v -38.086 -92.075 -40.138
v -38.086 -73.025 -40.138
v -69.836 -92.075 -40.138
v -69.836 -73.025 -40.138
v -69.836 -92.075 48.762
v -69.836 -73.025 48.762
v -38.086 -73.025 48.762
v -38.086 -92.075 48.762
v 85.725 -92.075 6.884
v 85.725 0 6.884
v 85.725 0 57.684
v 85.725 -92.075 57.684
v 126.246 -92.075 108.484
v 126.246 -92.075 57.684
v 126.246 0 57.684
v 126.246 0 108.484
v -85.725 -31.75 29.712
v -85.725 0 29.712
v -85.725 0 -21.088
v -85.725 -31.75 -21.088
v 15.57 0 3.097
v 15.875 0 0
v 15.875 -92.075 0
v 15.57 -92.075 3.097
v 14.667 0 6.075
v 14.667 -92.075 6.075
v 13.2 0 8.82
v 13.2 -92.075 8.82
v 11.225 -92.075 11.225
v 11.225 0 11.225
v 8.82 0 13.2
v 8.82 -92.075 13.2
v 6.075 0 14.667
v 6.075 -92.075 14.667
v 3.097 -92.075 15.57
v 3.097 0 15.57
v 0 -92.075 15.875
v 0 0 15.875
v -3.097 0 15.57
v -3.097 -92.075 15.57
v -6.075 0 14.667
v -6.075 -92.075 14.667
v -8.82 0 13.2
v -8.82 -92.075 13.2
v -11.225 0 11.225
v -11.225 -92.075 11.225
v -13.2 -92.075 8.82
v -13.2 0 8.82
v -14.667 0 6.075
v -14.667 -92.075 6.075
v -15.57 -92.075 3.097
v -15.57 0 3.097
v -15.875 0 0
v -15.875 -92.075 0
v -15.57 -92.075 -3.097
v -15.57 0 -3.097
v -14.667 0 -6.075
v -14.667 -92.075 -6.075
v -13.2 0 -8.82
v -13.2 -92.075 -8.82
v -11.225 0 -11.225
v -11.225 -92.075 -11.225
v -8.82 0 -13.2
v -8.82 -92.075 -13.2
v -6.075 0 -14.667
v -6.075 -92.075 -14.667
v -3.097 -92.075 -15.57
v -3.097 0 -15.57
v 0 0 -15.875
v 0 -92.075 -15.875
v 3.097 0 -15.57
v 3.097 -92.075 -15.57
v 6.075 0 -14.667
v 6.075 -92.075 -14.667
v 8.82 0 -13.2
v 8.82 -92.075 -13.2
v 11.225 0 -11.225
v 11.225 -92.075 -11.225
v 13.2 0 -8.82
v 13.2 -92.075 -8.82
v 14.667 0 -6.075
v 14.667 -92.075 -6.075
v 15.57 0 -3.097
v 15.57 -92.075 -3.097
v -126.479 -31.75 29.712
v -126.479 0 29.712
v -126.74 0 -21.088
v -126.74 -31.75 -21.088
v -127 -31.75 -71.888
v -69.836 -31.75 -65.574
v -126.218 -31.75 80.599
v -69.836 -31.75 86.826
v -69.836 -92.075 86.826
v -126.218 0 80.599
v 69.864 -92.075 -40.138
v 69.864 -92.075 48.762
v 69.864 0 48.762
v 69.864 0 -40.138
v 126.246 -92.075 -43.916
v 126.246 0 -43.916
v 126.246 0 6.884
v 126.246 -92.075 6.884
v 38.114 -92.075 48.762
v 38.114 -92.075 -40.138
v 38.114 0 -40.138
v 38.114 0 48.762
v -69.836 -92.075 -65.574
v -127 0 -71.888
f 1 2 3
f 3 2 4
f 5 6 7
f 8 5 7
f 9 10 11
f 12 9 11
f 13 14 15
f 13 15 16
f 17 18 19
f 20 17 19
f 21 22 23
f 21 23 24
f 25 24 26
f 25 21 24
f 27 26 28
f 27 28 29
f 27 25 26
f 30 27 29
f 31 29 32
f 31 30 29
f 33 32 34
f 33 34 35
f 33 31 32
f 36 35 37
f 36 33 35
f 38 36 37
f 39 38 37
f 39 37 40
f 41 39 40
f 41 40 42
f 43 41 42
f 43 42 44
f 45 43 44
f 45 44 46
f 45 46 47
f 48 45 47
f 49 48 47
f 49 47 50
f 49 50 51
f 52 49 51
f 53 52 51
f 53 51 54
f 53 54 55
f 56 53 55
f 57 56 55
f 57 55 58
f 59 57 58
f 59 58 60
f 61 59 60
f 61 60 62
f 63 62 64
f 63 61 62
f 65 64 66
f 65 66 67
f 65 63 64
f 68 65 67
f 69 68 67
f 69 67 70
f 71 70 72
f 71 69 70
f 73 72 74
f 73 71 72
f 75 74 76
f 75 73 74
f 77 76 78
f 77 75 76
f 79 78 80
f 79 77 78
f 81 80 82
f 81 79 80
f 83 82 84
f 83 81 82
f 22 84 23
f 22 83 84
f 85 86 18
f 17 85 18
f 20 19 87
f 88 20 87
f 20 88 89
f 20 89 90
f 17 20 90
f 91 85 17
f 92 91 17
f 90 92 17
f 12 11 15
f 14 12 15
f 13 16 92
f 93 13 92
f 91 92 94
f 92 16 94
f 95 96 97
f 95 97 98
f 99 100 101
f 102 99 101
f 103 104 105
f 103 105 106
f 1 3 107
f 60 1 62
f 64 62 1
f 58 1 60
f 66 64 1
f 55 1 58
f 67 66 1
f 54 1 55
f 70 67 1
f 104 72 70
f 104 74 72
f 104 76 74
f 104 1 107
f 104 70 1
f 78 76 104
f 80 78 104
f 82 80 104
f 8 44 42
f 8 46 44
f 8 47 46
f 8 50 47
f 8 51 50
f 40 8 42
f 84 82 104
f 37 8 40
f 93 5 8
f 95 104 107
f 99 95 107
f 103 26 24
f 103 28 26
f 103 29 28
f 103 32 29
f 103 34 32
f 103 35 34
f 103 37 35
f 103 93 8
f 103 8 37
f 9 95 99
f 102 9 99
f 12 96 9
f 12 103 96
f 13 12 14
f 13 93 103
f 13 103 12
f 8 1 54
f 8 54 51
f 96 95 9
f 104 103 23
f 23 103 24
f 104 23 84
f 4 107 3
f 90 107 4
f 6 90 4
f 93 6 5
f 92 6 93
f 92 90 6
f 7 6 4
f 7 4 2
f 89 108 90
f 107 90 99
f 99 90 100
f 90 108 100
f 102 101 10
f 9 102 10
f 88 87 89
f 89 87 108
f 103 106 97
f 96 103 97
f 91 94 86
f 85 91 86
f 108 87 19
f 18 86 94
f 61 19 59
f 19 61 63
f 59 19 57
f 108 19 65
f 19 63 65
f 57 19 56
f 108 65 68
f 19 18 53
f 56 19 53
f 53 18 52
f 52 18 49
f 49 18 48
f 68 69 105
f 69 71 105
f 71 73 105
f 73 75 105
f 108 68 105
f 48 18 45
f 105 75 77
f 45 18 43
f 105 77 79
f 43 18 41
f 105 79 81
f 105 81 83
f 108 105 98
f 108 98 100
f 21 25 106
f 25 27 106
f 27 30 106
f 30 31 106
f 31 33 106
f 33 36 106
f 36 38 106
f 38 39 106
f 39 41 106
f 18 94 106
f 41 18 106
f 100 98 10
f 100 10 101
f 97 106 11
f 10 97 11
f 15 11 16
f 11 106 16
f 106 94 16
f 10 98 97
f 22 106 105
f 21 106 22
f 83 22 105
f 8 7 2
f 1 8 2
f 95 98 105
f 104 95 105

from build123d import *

# Parameters (mm, degrees)
F0_R     = 15.875
F1_DEPTH = 31.75
F2_DEPTH = 92.075
F0_W     = 31.75
F0_H     = 88.9
F3_DEPTH = 73.025
F4_DEPTH = 53.975


# Not quite as in the source:
# - a feature names something its author has since deleted; it is built from what else it names


with BuildPart() as f1:
    # F0 (on Front) → F1 (new body)
    with BuildSketch(Plane.XZ):
        Polygon((-69.8361151936, 86.826035718), (-126.218325014, 80.5985571647), (-126.4791783958, 29.7122203269), (-85.725, 29.7122203269), (-85.725, -21.0877796731), (-126.7395891979, -21.0877796731), (-127, -71.8877796731), (-69.8361151936, -65.5739758634), (-69.8361151936, -40.1377796731), (-69.8361151936, 48.7622203269), align=None)
        Polygon((126.2463778257, 108.4835678339), (-69.8361151936, 86.826035718), (-69.8361151936, 48.7622203269), (-38.0861151936, 48.7622203269), (-38.0861151936, -40.1377796731), (-38.0861151936, -62.0671590745), (38.1138848064, -53.6507987812), (38.1138848064, -40.1378311361), (38.1138848064, 48.7622203269), (69.8638848064, 48.7622203269), (69.8638848064, -40.1378311361), (69.8638848064, -50.1439819923), (126.2463778257, -43.9164836263), (126.2463778257, 6.8835678339), (85.725, 6.8835678339), (85.725, 57.6835678339), (126.2463778257, 57.6835678339), align=None)
        Circle(F0_R, mode=Mode.SUBTRACT)
        Polygon((-38.0861151936, -40.1377796731), (-69.8361151936, -40.1377796731), (-69.8361151936, -65.5739758634), (-38.0861151936, -62.0671590745), align=None)
    extrude(amount=F1_DEPTH)

    # F0 (on Front) → F2 (join)
    with BuildSketch(Plane.XZ):
        Polygon((126.2463778257, 108.4835678339), (-69.8361151936, 86.826035718), (-69.8361151936, 48.7622203269), (-38.0861151936, 48.7622203269), (-38.0861151936, -40.1377796731), (-38.0861151936, -62.0671590745), (38.1138848064, -53.6507987812), (38.1138848064, -40.1378311361), (38.1138848064, 48.7622203269), (69.8638848064, 48.7622203269), (69.8638848064, -40.1378311361), (69.8638848064, -50.1439819923), (126.2463778257, -43.9164836263), (126.2463778257, 6.8835678339), (85.725, 6.8835678339), (85.725, 57.6835678339), (126.2463778257, 57.6835678339), align=None)
        Circle(F0_R, mode=Mode.SUBTRACT)
        Polygon((-38.0861151936, -40.1377796731), (-69.8361151936, -40.1377796731), (-69.8361151936, -65.5739758634), (-38.0861151936, -62.0671590745), align=None)
        Polygon((38.1138848064, -40.1378311361), (38.1138848064, -53.6507987812), (69.8638848064, -50.1439819923), (69.8638848064, -40.1378311361), align=None)
    extrude(amount=F2_DEPTH)

    # F0 (on Front) → F3 (join)
    with BuildSketch(Plane.XZ):
        with Locations((-53.9611151936, 4.3122203269)):
            Rectangle(F0_W, F0_H)
    extrude(amount=F3_DEPTH)

    # F0 (on Front) → F4 (join)
    with BuildSketch(Plane.XZ):
        Polygon((126.2463778257, 108.4835678339), (-69.8361151936, 86.826035718), (-69.8361151936, 48.7622203269), (-38.0861151936, 48.7622203269), (-38.0861151936, -40.1377796731), (-38.0861151936, -62.0671590745), (38.1138848064, -53.6507987812), (38.1138848064, -40.1378311361), (38.1138848064, 48.7622203269), (69.8638848064, 48.7622203269), (69.8638848064, -40.1378311361), (69.8638848064, -50.1439819923), (126.2463778257, -43.9164836263), (126.2463778257, 6.8835678339), (85.725, 6.8835678339), (85.725, 57.6835678339), (126.2463778257, 57.6835678339), align=None)
        Circle(F0_R, mode=Mode.SUBTRACT)
    extrude(amount=F4_DEPTH)


solid = f1.part
